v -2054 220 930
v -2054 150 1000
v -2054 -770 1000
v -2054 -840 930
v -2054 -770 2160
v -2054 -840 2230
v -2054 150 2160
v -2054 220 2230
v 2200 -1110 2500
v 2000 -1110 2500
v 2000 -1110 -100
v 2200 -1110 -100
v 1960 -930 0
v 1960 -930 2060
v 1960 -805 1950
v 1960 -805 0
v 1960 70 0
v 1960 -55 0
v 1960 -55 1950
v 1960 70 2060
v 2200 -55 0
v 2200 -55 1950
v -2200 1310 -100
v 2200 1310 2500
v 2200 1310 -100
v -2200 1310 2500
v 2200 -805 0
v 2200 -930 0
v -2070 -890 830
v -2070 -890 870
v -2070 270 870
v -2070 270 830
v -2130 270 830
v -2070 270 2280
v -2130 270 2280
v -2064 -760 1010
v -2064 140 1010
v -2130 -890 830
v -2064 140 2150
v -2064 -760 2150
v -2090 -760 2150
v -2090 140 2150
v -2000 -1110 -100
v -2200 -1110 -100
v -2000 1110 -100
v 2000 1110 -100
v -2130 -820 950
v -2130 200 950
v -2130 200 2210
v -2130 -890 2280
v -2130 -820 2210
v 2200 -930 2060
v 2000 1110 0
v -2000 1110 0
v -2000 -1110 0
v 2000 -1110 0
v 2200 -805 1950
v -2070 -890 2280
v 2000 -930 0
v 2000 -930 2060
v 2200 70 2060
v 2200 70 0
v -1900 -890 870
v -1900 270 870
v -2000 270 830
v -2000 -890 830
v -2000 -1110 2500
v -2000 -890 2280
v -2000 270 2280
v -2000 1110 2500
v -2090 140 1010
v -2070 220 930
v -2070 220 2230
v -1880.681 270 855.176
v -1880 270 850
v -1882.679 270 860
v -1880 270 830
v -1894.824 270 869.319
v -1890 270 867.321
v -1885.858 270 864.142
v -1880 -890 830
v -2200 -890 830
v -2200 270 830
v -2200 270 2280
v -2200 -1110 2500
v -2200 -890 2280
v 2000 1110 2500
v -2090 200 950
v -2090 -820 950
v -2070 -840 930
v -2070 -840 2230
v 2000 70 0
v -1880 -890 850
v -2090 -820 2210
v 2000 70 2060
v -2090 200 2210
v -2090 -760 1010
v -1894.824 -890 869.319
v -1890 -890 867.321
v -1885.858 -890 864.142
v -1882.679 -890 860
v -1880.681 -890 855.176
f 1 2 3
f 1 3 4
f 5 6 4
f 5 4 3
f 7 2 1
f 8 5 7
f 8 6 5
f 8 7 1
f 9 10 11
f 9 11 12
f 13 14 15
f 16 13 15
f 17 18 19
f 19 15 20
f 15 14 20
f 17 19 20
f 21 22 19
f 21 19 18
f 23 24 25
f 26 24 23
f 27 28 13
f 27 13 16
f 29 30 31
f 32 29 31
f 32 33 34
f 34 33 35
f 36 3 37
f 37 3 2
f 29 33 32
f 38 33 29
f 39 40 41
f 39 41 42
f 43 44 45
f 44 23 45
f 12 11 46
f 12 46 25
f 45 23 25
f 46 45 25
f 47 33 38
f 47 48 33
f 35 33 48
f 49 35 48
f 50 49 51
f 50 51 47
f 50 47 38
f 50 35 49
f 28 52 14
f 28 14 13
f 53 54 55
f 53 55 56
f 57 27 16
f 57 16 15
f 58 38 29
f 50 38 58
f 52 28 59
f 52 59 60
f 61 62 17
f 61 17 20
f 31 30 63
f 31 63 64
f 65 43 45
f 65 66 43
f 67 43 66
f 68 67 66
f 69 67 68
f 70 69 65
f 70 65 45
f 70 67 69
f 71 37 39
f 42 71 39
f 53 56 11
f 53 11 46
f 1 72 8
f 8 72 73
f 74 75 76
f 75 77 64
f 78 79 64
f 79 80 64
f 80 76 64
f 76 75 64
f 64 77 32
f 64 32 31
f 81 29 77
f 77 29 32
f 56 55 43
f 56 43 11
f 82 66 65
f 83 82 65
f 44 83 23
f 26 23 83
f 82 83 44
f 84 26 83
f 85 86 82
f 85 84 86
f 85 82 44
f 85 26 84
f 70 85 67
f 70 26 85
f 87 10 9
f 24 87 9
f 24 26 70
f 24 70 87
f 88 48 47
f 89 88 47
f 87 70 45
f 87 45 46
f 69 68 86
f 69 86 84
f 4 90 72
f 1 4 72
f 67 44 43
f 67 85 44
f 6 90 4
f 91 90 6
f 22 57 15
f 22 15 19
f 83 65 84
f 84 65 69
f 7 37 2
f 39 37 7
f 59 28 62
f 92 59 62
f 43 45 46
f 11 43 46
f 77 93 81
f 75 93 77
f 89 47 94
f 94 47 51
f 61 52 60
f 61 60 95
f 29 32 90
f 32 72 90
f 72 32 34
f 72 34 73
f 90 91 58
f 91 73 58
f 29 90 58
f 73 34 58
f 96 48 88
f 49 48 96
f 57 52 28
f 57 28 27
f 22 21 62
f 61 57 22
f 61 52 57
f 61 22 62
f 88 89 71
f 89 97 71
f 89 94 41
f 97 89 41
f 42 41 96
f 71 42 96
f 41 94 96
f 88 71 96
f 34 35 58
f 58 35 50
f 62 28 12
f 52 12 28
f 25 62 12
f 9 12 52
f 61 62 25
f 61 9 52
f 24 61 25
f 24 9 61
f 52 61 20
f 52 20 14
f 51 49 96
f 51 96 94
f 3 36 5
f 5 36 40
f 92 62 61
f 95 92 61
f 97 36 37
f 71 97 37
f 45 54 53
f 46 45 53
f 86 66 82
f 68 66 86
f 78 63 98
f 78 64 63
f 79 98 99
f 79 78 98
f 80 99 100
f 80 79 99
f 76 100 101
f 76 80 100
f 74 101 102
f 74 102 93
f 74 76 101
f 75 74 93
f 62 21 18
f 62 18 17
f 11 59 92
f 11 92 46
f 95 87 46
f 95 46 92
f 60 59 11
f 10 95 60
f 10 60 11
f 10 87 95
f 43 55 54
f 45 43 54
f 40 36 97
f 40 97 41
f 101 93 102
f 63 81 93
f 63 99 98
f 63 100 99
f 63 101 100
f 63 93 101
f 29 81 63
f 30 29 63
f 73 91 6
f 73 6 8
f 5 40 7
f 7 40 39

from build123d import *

# Parameters (mm, degrees)
F0_W           = 4000
F0_H           = 2220
F1_DEPTH       = 100
F3_DEPTH       = 2500
F3_DEPTH_BACK  = 100
F4_W           = 1160
F4_H           = 1450
F5_DEPTH       = 200
F6_W           = 1000
F6_H           = 2060
F7_DEPTH       = 200
F9_DEPTH       = 240
F11_START      = -70
F10_W          = 1160
F10_H          = 1450
F10_W_2        = 1020
F10_H_2        = 1260
F11_DEPTH      = 60
F12_W          = 1060
F12_H          = 1300
F12_W_2        = 900
F12_H_2        = 1140
F13_DEPTH      = 16
F13_DEPTH_BACK = 20
F14_SIZE       = 10
F15_W          = 1160
F15_H          = 40
F16_DEPTH      = 190
F17_R          = 20


with BuildPart() as f1:
    # F0 (on Top) → F1 (new body)
    with BuildSketch(Plane.XY):
        Rectangle(F0_W, F0_H)
    extrude(amount=-F1_DEPTH)


with BuildPart() as f3:
    # F2 (on face) → F3 (new body, two sides)
    with BuildSketch(Plane.XY) as f3_sk:
        Polygon((-2200, -1110), (-2000, -1110), (-2000, 1110), (2000, 1110), (2000, -1110), (2200, -1110), (2200, 1310), (-2200, 1310), align=None)
    extrude(amount=F3_DEPTH)
    extrude(f3_sk.sketch, amount=-F3_DEPTH_BACK)

    # F4 (on face) → F5 (cut, through all)
    with BuildSketch(Plane.YZ.offset(-2000)):
        with Locations((-310, 1555)):
            Rectangle(F4_W, F4_H)
    extrude(amount=-F5_DEPTH, mode=Mode.SUBTRACT)

    # F6 (on face) → F7 (cut, through all)
    with BuildSketch(Plane.YZ.offset(2200)):
        with Locations((-430, 1030)):
            Rectangle(F6_W, F6_H)
    extrude(amount=-F7_DEPTH, mode=Mode.SUBTRACT)


with BuildPart() as f9:
    # F8 (on face) → F9 (new body)
    with BuildSketch(Plane.YZ.offset(2200)):
        Polygon((70, 2060), (-930, 2060), (-930, 0), (-805, 0), (-805, 1950), (-55, 1950), (-55, 0), (70, 0), align=None)
    extrude(amount=-F9_DEPTH)


with BuildPart() as f11:
    # F10 (on face) → F11 (new body)
    with BuildSketch(Plane(origin=(-2200, 0, 0), x_dir=(0, -1, 0), z_dir=(-1, 0, 0)).offset(F11_START)):
        with Locations((310, 1555)):
            Rectangle(F10_W, F10_H)
        with Locations((310, 1580)):
            Rectangle(F10_W_2, F10_H_2, mode=Mode.SUBTRACT)
    extrude(amount=-F11_DEPTH)

    # F12 (on face) → F13 (join, two sides)
    with BuildSketch(Plane.YZ.offset(-2070)) as f13_sk:
        with Locations((-310, 1580)):
            Rectangle(F12_W, F12_H)
        with Locations((-310, 1580)):
            Rectangle(F12_W_2, F12_H_2, mode=Mode.SUBTRACT)
    extrude(amount=F13_DEPTH)
    extrude(f13_sk.sketch, amount=-F13_DEPTH_BACK)

    # F14
    f14_edges = [f11.edges().sort_by_distance(p)[0] for p in [
        (-2054, 140, 1580),
        (-2054, -310, 1010),
        (-2054, -760, 1580),
        (-2054, -310, 2150),
    ]]
    chamfer(f14_edges, length=F14_SIZE)


with BuildPart() as f16:
    # F15 (on face) → F16 (new body)
    with BuildSketch(Plane.YZ.offset(-2070)):
        with Locations((-310, 850)):
            Rectangle(F15_W, F15_H)
    extrude(amount=F16_DEPTH)

    # F17
    f17_edges = [f16.edges().sort_by_distance(p)[0] for p in [
        (-1880, -310, 870),
    ]]
    fillet(f17_edges, radius=F17_R)


solid = Compound([f1.part, f3.part, f9.part, f11.part, f16.part])
